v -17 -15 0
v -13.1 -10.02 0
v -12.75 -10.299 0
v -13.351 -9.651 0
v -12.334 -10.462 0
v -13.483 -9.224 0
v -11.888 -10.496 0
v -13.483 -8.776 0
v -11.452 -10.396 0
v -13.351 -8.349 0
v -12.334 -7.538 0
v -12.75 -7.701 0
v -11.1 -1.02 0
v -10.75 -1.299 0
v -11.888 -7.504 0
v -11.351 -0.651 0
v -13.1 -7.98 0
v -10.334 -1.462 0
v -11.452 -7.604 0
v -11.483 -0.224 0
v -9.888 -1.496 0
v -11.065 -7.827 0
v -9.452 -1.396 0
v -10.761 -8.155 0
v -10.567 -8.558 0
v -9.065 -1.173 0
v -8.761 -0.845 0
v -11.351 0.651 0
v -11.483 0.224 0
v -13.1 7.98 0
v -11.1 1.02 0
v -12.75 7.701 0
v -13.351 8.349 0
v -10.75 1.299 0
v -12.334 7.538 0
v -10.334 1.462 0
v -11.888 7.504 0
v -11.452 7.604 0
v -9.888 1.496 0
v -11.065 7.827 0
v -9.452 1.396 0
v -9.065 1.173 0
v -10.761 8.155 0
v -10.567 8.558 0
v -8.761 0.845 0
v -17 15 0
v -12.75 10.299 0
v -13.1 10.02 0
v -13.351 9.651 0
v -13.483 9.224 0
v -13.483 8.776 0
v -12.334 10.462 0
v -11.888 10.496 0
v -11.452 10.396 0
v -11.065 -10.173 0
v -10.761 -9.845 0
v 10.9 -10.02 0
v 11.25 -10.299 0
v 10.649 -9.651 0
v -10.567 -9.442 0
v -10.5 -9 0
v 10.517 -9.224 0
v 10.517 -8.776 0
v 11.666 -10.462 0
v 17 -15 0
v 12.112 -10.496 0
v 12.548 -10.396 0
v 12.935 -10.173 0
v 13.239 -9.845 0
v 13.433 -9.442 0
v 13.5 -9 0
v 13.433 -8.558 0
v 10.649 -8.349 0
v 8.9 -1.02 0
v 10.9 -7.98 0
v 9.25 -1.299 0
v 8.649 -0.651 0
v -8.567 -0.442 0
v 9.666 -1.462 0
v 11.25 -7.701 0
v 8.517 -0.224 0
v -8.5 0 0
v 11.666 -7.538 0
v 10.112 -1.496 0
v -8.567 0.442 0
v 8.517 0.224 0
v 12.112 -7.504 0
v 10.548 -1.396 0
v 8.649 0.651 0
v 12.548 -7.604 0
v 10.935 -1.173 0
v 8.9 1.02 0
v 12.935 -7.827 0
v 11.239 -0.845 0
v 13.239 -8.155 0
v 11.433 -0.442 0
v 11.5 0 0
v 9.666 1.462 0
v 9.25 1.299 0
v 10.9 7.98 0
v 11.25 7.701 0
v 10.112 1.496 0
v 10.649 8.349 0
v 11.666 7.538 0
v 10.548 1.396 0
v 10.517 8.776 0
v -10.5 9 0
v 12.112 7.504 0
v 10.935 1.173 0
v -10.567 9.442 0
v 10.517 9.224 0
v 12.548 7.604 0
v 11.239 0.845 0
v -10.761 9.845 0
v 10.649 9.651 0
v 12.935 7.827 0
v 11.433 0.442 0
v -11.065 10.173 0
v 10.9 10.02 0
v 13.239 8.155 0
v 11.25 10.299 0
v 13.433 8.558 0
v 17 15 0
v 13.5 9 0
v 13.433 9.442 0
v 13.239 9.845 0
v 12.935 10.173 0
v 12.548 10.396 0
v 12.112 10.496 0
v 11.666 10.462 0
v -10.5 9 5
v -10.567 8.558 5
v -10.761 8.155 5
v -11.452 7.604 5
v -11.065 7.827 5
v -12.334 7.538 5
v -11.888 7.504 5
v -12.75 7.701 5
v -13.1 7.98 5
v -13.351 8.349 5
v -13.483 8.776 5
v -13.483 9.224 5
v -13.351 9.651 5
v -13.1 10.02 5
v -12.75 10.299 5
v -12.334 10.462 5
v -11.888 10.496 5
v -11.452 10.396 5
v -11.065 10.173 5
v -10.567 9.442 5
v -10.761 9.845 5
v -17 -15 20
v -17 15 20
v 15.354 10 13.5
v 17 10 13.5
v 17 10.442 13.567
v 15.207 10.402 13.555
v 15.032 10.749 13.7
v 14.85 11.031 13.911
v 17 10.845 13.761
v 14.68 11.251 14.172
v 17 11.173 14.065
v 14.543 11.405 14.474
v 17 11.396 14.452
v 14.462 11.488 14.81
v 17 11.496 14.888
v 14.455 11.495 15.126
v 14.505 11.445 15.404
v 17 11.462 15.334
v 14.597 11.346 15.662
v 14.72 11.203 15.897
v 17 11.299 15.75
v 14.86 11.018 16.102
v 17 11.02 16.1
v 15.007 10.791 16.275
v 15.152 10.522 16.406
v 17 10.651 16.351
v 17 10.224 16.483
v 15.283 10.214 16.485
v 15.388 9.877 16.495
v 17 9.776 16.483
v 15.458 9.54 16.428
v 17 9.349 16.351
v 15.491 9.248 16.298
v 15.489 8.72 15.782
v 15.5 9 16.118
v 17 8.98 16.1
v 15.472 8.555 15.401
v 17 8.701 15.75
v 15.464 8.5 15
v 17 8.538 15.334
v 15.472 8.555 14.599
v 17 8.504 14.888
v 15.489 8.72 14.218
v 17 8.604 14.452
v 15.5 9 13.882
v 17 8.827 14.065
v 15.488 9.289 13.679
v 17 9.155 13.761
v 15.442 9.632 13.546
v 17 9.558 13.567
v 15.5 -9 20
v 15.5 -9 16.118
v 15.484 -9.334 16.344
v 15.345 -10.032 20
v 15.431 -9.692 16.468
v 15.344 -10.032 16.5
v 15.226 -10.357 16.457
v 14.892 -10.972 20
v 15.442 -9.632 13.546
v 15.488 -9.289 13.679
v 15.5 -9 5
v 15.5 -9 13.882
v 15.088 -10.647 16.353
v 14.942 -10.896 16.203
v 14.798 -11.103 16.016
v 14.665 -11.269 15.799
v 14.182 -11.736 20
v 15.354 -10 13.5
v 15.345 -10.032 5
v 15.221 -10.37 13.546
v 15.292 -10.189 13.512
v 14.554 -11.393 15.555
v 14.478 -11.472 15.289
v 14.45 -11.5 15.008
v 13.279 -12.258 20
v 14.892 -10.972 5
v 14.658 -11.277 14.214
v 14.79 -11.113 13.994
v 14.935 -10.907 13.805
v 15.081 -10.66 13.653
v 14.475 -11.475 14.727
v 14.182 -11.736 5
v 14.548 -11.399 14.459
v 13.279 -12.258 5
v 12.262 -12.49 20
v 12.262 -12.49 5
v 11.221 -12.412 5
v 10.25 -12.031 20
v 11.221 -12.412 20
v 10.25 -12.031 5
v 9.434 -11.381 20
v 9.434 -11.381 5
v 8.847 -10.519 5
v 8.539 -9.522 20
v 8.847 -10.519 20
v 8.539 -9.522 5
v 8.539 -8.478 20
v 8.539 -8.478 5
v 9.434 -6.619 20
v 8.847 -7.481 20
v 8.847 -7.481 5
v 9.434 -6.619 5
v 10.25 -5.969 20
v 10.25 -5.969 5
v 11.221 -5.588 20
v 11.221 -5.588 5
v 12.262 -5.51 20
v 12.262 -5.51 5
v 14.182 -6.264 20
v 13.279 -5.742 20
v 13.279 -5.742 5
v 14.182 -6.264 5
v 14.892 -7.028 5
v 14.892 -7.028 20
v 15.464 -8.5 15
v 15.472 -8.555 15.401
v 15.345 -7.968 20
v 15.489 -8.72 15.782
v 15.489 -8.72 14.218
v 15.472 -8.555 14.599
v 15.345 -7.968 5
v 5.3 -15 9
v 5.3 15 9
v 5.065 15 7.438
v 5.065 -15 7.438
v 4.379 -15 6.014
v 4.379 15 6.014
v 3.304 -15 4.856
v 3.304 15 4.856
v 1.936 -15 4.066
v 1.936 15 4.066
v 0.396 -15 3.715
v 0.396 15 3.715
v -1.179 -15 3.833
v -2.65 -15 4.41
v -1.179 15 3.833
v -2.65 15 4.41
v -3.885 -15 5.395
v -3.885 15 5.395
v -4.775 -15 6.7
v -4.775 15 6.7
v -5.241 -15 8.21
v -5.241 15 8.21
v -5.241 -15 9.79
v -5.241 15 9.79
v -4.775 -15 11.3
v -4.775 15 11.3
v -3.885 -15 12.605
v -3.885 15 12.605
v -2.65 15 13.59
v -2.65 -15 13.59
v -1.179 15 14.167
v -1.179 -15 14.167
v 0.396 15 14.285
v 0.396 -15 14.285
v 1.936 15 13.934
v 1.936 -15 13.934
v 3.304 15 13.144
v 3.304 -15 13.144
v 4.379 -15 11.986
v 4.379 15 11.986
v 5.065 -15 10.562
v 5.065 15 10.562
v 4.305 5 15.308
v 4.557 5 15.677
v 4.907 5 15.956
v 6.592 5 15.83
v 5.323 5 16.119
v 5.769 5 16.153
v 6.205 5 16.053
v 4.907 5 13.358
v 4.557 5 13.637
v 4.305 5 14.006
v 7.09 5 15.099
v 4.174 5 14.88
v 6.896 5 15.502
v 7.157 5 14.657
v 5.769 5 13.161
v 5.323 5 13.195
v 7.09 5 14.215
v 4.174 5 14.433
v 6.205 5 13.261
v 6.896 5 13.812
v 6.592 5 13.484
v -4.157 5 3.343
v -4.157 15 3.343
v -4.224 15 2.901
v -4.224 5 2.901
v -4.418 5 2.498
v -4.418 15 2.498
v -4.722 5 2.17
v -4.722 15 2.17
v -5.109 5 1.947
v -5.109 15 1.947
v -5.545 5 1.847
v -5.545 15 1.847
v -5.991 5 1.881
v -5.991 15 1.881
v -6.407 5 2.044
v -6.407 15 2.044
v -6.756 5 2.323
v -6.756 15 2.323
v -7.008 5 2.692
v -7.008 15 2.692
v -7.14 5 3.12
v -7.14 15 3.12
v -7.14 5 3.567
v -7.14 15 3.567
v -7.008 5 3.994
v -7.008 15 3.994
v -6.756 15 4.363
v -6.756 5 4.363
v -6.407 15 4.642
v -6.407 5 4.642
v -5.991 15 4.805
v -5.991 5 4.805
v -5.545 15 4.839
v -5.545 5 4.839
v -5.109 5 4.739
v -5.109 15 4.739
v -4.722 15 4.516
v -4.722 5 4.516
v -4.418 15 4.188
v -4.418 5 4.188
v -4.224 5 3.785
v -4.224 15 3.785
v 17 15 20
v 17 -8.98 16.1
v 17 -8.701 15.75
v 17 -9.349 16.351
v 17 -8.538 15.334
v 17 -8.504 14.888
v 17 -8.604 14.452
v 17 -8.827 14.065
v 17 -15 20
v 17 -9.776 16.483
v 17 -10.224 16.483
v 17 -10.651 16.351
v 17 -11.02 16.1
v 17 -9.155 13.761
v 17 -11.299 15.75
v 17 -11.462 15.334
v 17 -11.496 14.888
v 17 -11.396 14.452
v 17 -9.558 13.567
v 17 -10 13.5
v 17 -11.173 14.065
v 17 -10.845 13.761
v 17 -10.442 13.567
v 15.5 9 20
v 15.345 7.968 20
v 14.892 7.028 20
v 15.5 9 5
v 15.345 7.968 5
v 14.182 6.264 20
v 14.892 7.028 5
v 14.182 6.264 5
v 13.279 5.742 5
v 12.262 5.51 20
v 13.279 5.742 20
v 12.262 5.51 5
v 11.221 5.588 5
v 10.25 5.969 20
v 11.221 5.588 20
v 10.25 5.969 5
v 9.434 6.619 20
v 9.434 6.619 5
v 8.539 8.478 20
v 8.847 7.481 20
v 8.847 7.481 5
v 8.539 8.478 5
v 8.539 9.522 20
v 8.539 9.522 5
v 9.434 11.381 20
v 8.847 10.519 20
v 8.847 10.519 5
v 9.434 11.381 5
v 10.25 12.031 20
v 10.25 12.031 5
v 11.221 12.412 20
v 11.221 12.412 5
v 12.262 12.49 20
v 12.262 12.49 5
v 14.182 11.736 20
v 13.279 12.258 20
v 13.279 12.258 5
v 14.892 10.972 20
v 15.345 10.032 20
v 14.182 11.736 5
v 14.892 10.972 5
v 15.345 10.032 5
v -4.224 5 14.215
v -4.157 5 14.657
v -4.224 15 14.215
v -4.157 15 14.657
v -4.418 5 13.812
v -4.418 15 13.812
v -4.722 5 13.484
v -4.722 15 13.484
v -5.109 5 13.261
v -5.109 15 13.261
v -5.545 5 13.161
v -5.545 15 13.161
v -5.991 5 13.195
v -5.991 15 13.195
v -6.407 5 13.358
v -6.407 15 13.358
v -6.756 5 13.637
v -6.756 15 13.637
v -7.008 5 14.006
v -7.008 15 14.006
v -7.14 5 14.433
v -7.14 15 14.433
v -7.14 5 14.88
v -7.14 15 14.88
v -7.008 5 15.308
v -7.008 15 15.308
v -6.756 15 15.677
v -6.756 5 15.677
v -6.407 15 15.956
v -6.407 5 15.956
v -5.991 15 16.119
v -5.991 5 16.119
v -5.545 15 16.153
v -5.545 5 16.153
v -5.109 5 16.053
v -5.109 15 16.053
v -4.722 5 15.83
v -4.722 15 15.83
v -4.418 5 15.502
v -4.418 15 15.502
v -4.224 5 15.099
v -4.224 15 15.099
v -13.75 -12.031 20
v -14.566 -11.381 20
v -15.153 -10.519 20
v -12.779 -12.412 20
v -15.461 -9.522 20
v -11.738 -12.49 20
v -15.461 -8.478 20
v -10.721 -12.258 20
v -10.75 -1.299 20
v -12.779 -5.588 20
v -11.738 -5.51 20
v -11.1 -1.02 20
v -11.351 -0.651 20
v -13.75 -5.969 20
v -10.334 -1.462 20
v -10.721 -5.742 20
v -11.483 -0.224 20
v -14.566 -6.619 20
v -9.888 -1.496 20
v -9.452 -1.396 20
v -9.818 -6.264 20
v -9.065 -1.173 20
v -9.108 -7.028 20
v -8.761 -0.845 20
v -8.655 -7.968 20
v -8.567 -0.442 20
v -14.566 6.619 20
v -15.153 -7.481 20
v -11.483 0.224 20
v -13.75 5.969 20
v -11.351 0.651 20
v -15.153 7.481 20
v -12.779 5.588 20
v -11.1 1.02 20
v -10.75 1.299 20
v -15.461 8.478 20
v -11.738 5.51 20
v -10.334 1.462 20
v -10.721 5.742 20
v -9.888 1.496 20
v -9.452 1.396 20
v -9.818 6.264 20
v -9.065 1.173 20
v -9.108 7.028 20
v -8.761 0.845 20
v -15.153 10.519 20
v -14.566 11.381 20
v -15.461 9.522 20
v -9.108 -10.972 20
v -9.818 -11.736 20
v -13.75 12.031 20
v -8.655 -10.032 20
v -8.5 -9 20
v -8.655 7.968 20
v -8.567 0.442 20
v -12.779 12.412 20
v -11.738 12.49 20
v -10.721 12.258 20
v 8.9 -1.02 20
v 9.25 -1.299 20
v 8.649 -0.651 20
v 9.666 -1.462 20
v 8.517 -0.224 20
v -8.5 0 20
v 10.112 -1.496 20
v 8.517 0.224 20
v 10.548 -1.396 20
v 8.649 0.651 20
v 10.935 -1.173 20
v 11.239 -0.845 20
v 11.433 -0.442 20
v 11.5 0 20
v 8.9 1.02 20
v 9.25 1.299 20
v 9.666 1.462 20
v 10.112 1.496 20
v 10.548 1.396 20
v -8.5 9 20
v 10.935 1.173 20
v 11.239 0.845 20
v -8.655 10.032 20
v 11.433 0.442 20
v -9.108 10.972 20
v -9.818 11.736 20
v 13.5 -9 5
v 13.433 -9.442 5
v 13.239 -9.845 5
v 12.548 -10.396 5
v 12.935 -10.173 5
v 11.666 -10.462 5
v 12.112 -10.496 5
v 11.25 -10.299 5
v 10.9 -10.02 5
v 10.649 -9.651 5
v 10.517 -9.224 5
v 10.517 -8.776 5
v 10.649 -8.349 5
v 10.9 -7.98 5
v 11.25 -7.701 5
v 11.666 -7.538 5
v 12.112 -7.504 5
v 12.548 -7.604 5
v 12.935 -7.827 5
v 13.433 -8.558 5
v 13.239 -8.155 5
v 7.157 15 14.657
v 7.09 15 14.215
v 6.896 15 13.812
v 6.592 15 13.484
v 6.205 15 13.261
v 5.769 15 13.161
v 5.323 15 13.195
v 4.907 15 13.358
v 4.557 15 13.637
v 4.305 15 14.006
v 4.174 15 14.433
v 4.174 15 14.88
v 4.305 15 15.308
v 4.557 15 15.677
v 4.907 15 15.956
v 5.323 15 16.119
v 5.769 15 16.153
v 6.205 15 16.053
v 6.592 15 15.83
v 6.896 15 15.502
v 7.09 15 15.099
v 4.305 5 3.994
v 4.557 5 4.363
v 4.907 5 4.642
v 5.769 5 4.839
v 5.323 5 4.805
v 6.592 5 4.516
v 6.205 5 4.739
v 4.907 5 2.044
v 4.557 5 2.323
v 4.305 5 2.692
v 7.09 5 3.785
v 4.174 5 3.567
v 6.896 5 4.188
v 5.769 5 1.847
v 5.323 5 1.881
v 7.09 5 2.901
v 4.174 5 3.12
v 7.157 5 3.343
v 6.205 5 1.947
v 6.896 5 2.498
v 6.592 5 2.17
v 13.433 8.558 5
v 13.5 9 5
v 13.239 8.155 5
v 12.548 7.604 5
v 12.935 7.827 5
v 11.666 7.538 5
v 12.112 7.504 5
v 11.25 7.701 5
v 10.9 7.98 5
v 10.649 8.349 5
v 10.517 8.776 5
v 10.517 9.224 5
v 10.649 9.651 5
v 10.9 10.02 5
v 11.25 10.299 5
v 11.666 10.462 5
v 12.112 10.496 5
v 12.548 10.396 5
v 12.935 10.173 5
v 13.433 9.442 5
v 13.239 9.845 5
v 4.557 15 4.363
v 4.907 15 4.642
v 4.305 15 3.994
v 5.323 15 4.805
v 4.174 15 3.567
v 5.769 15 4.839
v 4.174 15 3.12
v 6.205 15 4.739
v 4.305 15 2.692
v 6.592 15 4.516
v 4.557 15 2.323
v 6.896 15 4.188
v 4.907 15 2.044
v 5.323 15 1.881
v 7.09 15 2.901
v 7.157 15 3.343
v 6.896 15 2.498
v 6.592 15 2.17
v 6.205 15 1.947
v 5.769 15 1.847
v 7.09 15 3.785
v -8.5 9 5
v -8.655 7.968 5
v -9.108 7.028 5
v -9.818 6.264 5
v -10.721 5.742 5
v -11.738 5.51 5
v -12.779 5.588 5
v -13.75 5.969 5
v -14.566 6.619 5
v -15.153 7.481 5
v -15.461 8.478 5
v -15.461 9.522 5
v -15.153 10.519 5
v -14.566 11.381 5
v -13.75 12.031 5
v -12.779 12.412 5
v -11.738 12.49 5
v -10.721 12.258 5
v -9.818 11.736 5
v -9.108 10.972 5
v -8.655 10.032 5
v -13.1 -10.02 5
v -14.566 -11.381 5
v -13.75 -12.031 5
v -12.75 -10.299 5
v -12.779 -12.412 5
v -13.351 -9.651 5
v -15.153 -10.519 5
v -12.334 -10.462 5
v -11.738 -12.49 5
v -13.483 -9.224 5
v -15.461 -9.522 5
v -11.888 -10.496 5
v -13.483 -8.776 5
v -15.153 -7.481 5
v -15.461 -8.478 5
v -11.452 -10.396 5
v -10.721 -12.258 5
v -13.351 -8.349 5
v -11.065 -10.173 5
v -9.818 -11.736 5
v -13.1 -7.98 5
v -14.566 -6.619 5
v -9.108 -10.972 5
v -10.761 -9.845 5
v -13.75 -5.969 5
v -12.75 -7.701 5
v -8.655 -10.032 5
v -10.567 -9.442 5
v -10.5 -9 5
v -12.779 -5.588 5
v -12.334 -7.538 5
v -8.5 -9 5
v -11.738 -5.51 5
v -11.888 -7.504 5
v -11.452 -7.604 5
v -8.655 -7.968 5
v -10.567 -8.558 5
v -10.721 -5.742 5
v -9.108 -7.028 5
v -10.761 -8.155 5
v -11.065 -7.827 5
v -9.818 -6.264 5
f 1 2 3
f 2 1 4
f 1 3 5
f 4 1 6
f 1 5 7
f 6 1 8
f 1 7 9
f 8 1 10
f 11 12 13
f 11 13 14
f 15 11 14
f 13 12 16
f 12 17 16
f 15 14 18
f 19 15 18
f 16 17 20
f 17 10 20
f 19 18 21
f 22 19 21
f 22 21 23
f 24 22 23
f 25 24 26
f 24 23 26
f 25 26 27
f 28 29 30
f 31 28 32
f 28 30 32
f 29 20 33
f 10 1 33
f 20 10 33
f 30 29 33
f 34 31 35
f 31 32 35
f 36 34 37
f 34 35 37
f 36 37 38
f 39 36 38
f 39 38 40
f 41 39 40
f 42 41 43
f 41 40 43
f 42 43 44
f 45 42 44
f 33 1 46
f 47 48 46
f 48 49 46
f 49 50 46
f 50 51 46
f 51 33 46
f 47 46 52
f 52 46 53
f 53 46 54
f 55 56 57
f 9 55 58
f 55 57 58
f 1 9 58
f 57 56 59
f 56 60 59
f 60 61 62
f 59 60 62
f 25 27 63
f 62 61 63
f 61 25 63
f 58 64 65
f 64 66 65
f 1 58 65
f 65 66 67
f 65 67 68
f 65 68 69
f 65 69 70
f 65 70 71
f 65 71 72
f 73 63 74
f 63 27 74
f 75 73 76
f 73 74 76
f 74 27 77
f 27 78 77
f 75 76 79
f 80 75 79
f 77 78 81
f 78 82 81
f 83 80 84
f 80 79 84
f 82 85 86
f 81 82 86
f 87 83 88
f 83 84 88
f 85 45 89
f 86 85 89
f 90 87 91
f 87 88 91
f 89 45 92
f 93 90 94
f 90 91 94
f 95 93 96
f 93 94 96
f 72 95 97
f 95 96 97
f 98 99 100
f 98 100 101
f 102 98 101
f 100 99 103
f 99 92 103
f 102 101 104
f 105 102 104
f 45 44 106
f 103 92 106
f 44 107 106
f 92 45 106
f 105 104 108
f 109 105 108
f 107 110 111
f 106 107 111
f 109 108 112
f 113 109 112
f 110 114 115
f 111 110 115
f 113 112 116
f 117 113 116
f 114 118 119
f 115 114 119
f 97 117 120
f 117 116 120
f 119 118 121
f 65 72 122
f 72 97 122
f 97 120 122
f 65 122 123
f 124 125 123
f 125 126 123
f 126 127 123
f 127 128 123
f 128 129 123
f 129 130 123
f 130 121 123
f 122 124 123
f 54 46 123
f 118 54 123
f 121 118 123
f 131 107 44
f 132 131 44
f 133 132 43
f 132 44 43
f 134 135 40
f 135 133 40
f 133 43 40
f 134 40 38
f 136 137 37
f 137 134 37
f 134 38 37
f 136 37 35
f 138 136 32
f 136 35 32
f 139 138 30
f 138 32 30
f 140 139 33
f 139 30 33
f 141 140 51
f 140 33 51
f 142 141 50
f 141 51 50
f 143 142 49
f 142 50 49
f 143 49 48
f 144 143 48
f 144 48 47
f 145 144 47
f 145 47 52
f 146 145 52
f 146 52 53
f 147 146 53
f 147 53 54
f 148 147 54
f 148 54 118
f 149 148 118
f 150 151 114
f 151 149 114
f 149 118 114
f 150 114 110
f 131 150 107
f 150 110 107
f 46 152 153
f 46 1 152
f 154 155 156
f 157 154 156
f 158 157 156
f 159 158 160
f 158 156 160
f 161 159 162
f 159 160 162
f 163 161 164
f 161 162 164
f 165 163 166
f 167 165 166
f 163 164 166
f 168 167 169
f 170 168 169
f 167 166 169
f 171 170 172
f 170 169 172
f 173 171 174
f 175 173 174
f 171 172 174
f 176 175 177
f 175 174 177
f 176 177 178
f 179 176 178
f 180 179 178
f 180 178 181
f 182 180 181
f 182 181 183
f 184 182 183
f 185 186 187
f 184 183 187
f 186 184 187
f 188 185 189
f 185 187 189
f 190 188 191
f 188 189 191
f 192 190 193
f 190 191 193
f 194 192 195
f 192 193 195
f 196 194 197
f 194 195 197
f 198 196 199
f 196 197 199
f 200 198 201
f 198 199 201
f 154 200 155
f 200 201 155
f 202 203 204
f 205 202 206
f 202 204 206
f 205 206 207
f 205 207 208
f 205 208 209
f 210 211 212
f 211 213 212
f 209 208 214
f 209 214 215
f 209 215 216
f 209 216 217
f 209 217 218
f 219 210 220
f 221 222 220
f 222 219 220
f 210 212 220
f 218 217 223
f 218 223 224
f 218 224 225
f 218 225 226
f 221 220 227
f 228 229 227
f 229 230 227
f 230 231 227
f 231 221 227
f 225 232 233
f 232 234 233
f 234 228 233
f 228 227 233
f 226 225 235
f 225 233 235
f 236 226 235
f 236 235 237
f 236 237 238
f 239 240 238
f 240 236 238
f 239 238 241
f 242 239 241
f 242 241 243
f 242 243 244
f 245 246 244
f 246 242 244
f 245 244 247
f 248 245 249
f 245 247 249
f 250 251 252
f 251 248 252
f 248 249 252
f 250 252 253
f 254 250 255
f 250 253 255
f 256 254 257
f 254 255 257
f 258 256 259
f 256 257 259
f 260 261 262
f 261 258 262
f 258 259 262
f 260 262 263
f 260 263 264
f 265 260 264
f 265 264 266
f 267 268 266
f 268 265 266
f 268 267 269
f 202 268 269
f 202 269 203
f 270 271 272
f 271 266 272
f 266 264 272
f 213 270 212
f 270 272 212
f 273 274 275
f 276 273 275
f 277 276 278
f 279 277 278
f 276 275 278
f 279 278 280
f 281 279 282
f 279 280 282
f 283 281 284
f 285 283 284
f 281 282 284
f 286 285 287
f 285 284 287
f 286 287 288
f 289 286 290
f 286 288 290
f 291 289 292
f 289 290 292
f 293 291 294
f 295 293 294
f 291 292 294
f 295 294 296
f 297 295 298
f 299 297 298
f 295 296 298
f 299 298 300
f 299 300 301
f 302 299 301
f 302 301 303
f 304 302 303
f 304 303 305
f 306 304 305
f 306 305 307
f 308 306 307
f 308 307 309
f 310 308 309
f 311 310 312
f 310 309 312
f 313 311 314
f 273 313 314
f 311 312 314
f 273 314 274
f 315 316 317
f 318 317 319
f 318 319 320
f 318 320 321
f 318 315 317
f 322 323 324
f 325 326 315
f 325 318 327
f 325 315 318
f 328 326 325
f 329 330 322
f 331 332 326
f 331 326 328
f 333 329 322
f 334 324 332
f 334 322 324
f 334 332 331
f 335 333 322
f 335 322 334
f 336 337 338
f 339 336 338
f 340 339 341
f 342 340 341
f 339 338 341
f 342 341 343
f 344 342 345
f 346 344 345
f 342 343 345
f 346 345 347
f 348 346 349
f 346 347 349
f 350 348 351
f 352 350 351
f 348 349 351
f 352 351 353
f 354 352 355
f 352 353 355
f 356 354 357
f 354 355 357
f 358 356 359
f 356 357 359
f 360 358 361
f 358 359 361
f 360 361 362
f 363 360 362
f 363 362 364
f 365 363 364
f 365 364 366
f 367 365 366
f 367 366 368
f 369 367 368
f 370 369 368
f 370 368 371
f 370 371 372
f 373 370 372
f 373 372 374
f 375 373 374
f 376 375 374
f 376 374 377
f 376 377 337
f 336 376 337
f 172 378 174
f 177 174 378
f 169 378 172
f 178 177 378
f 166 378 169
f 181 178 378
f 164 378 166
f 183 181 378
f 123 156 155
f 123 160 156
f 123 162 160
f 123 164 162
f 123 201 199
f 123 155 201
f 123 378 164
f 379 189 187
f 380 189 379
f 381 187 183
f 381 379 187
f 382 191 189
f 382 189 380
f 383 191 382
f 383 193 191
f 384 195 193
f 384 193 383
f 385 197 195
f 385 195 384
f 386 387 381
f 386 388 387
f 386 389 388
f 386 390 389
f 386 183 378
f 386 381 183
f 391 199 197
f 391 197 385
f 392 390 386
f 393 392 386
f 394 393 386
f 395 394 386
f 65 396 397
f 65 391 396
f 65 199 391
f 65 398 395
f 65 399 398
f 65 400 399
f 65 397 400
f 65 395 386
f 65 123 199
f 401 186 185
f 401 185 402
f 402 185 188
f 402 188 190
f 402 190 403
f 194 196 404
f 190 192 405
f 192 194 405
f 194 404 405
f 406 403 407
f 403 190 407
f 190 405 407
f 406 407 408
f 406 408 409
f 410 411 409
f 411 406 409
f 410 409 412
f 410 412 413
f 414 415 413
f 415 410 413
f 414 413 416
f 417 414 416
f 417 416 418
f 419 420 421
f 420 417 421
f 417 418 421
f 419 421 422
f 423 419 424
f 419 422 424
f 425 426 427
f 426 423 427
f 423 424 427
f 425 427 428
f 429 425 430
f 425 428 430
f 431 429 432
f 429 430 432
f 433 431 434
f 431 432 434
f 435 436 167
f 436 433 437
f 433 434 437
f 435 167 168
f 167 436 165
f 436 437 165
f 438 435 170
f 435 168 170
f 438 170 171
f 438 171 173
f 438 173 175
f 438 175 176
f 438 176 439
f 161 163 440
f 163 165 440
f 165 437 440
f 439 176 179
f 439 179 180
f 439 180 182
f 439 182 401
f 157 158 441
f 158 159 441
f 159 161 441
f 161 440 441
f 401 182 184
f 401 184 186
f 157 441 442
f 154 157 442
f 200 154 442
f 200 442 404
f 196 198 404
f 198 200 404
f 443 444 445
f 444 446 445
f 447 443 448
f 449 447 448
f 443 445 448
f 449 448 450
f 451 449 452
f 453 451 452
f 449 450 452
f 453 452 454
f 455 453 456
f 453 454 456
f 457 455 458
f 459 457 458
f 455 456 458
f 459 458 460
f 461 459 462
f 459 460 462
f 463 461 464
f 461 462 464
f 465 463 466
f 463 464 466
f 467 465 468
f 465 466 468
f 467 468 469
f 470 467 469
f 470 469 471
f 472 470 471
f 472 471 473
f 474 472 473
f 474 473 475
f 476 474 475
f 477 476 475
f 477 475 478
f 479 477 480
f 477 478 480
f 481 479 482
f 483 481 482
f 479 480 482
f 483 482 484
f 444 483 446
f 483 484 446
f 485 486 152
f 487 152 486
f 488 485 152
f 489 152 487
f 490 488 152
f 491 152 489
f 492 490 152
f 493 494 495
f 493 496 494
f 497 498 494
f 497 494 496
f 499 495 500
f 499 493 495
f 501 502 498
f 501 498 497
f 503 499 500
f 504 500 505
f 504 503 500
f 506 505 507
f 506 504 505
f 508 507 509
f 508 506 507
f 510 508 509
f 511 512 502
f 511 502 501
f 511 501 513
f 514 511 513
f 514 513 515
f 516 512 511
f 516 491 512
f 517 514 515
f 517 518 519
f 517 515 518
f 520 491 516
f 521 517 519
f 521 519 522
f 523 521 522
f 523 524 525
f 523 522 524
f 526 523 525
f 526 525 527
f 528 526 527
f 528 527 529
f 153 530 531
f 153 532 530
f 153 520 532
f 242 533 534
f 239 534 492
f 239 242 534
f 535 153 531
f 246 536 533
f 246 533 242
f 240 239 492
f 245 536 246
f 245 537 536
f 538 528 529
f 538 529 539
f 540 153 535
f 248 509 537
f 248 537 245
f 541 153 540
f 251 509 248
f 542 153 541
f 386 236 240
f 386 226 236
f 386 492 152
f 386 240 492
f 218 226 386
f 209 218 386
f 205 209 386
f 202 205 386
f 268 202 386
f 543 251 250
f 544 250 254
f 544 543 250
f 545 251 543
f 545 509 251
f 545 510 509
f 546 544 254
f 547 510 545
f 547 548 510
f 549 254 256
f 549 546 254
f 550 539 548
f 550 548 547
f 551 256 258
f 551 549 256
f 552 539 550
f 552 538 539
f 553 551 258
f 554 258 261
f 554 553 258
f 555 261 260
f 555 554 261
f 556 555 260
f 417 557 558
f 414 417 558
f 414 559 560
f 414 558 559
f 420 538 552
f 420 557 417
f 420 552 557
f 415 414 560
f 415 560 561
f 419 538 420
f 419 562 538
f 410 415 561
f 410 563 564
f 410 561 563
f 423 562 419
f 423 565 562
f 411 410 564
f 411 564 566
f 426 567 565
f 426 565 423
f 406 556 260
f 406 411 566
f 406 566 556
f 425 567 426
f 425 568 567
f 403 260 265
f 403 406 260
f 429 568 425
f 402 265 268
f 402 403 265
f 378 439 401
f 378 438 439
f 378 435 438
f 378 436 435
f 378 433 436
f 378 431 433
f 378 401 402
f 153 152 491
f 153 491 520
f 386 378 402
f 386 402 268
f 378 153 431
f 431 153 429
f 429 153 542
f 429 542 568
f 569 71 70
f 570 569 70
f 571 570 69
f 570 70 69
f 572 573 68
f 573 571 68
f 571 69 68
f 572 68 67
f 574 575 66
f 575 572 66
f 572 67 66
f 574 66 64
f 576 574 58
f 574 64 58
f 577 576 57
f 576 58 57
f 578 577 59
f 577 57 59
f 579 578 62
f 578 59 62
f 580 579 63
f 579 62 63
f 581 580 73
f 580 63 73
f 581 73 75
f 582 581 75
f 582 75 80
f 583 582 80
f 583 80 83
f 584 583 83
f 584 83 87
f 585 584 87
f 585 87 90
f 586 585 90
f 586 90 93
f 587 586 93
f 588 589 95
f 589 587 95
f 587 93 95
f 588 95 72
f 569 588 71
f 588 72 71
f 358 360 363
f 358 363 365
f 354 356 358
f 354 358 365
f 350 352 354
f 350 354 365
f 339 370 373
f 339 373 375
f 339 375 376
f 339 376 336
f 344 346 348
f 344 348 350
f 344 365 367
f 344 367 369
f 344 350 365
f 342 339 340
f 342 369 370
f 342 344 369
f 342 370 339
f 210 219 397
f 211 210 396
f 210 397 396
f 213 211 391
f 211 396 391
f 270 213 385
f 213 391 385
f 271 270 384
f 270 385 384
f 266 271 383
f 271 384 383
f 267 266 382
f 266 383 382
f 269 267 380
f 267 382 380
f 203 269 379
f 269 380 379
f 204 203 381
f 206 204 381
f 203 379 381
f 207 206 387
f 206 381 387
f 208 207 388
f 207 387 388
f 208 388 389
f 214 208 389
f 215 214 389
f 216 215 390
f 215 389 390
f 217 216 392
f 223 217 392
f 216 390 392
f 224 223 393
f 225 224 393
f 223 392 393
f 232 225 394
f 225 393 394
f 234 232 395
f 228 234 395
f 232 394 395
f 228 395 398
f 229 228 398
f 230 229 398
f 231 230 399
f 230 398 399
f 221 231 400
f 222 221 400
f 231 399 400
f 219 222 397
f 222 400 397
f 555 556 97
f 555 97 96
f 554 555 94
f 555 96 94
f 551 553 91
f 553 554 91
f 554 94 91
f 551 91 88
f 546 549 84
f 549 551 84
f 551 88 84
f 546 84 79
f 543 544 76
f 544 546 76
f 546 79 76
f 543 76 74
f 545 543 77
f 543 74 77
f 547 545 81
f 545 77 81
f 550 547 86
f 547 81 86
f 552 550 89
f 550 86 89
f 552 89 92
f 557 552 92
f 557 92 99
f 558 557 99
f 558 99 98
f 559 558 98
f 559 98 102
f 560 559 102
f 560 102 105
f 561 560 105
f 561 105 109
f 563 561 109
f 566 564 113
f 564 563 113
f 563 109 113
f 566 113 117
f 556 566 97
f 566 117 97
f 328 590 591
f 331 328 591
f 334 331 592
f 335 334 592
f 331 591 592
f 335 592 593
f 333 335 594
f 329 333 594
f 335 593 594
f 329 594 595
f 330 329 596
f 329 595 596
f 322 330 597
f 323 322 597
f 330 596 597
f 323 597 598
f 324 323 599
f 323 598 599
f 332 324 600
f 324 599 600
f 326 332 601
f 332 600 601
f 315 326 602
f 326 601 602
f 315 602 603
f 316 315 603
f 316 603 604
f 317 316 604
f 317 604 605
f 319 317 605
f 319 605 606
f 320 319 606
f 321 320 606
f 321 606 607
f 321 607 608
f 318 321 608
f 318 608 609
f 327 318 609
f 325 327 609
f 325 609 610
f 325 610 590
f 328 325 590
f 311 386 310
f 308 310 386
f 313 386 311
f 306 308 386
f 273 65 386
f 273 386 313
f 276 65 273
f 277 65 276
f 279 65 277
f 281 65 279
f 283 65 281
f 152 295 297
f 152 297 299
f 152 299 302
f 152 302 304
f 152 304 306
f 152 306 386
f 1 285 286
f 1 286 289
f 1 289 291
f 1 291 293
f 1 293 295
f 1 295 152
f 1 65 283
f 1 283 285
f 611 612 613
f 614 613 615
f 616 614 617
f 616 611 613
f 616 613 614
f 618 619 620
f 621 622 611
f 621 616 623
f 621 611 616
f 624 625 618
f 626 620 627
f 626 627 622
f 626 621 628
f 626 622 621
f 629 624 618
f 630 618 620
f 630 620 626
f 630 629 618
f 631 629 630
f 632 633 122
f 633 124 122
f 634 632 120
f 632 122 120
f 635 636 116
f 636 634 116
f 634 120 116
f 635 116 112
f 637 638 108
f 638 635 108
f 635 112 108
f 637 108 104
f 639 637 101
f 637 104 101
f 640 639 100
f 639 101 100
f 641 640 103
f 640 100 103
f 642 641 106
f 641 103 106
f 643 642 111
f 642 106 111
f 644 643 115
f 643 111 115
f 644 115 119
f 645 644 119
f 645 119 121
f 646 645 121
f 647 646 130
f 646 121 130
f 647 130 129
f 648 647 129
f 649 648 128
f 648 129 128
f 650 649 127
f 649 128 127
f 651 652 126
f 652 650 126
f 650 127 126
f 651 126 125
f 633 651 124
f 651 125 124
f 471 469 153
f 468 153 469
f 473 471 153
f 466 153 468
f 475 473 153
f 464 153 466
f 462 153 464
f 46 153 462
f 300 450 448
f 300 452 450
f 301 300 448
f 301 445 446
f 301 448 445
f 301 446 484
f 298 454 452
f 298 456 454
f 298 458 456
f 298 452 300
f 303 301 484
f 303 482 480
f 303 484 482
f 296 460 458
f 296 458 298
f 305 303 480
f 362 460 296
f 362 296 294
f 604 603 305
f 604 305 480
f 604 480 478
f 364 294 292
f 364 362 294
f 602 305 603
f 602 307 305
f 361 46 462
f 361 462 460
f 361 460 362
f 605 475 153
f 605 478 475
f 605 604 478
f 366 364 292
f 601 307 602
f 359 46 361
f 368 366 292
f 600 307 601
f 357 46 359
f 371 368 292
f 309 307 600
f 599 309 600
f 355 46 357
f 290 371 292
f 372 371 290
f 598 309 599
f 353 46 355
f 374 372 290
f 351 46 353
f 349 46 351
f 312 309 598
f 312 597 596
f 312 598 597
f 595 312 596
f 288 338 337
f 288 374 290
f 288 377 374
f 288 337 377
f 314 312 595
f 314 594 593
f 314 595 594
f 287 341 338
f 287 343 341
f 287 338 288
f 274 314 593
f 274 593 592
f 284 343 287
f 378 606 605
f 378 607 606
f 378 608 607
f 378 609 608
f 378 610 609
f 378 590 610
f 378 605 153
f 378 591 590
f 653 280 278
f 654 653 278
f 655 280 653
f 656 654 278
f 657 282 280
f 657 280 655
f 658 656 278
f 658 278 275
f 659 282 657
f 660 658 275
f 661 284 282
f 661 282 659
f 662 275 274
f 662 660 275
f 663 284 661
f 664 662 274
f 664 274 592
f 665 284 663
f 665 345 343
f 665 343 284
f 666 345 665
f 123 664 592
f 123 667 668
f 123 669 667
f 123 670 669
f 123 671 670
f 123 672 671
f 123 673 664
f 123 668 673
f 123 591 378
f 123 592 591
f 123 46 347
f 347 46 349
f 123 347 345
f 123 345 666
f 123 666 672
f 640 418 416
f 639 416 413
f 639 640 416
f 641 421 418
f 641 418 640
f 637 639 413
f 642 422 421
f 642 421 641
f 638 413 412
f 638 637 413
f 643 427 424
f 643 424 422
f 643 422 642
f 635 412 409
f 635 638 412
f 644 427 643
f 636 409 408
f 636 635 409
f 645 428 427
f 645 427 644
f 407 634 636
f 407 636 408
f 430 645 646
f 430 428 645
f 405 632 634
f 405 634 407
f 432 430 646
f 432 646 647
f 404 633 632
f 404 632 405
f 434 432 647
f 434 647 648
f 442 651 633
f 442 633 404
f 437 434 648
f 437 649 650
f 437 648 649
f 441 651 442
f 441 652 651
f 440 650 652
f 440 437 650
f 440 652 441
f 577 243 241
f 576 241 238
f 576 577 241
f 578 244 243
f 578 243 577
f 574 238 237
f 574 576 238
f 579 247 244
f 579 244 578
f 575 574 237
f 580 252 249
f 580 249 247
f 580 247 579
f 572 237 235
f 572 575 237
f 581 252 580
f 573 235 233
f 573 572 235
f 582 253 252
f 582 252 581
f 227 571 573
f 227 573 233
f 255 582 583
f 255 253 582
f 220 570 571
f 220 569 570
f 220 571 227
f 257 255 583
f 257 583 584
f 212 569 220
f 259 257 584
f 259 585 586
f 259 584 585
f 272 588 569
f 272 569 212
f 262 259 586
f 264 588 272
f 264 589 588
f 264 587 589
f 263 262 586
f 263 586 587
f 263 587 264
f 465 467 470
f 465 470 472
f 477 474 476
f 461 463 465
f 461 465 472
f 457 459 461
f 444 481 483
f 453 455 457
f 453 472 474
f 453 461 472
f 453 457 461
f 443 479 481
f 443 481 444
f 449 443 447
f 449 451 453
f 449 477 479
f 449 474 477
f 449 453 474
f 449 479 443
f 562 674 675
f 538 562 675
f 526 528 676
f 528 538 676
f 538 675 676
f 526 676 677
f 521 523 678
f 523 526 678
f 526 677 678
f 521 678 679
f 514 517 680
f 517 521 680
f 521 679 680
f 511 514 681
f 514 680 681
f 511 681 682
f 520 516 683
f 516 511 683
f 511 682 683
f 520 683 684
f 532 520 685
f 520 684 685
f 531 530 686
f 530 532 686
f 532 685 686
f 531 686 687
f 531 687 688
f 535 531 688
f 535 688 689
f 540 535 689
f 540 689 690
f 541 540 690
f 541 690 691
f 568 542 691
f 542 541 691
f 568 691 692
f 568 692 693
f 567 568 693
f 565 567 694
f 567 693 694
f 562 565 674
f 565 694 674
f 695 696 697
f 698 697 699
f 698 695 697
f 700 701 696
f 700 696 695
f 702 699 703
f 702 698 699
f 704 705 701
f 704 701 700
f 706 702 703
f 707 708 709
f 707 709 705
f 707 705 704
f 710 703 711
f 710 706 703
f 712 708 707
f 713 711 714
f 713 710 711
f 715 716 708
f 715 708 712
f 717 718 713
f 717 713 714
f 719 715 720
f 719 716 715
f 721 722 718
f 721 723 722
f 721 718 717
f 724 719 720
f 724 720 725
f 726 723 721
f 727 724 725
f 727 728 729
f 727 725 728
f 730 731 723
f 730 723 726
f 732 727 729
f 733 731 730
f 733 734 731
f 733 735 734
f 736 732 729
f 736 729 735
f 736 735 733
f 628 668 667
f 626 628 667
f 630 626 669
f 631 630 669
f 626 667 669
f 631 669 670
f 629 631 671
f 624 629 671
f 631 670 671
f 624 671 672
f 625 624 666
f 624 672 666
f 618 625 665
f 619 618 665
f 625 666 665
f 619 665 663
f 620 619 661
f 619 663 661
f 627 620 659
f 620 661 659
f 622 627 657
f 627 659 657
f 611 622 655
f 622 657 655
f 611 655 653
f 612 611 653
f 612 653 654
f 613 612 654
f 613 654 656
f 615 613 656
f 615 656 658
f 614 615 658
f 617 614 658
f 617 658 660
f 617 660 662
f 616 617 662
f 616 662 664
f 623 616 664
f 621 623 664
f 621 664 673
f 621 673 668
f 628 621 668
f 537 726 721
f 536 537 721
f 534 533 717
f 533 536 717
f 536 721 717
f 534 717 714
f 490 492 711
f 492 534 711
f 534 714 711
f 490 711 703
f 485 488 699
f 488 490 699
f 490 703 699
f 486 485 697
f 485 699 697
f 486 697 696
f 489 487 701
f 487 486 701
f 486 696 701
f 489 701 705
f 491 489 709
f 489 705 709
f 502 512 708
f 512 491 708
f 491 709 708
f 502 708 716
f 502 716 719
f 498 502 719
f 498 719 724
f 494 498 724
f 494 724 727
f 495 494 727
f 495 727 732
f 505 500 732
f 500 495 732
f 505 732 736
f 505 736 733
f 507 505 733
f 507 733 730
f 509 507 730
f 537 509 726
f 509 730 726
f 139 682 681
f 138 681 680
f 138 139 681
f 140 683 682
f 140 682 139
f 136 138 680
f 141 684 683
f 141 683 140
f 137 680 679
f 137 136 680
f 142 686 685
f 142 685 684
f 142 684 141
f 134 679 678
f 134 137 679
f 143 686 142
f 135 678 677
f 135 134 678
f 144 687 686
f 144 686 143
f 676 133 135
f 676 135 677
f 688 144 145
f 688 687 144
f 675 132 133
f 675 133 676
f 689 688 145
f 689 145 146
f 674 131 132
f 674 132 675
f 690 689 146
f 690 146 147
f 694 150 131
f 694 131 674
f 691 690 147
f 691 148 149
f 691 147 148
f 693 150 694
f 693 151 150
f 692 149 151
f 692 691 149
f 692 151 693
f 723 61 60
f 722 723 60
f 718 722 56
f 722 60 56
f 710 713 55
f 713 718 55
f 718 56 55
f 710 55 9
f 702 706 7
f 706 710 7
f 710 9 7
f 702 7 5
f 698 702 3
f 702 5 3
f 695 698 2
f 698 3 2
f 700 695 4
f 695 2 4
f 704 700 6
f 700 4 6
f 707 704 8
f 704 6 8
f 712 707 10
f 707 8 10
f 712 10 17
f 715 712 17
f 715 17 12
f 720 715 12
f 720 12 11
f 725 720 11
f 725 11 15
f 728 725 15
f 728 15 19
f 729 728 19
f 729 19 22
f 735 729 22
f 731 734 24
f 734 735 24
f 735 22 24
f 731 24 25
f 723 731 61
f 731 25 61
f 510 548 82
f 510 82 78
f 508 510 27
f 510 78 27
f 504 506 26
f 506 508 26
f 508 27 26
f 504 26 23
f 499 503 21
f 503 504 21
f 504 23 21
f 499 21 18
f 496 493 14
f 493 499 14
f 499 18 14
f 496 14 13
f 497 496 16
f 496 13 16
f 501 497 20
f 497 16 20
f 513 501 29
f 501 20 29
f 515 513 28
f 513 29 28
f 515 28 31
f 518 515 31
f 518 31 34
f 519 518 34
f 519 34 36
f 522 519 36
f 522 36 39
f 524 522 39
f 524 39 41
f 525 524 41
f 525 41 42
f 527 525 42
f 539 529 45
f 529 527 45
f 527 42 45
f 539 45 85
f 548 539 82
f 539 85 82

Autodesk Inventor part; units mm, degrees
ref_plane "YZ Plane" through (0, 0, 0) normal (1, 0, 0) x (0, 1, 0)
ref_plane "XZ Plane" through (0, 0, 0) normal (0, 1, 0) x (-1, 0, 0)
ref_plane "XY Plane" through (0, 0, 0) normal (0, 0, 1) x (1, 0, 0)
sketch "Sketch1" plane through (0, 0, 0) normal (0, 0, 1) x (1, 0, 0)
  circle A0 centre (-12, 9) radius 1.5
  line L0 (12, -9) -> (-12, -9) construction
  line L1 (-12, -9) -> (-12, 9) construction
  line L2 (-12, 9) -> (12, 9) construction
  line L3 (12, 9) -> (12, -9) construction
  line L4 (12, -9) -> (-12, 9) construction
  line L5 (-12, -9) -> (12, 9) construction
  circle A1 centre (12, 9) radius 1.5
  circle A2 centre (12, -9) radius 1.5
  circle A3 centre (-12, -9) radius 1.5
  line L6 (17, -15) -> (-17, -15)
  line L7 (-17, -15) -> (-17, 15)
  line L8 (-17, 15) -> (17, 15)
  line L9 (17, 15) -> (17, -15)
  line L10 (17, -15) -> (-17, 15) construction
  line L11 (-17, -15) -> (17, 15) construction
  circle A4 centre (0, 0) radius 4
  circle A5 centre (12, 9) radius 3.5
  circle A6 centre (-12, 9) radius 3.5
  circle A7 centre (-12, -9) radius 3.5
  circle A8 centre (12, -9) radius 3.5
  circle A9 centre (10, 0) radius 1.5
  circle A10 centre (-10, 0) radius 1.5
  line L12 (10, 0) -> (0, 0) construction
  line L13 (0, 0) -> (-10, 0) construction
  point P0 (0, 0)
  dimension "d0" = 3
  dimension "d1" = 24
  dimension "d2" = 18
  dimension "d3" = 3
  dimension "d4" = 3
  dimension "d5" = 3
  dimension "d6" = 34
  dimension "d7" = 30
  dimension "d8" = 8
  dimension "d15" = 2
  dimension "d16" = 2
  dimension "d17" = 2
  dimension "d18" = 2
  dimension "d59" = 3
  dimension "d60" = 10
  dimension "d61" = 10
  dimension "d62" = 3
extrude "Extrusion1" add sketch "Sketch1" along normal blind 20 contours L6 L7 L8 L9 | A4
extrude "Extrusion3" add sketch "Sketch1" along normal blind 5 from surface at 0 contours A5 | A6 | A7 | A8
sketch "Sketch2" plane through (-17, 15, 0) normal (0, 1, 0) x (1, 0, 0)
  circle A0 centre (17, -9) radius 5.3
  line L0 (17, -9) -> (17, 0) construction
  line L1 (17, -9) -> (22.6569, -14.6569) construction
  line L2 (17, -9) -> (25, -9) construction
  circle A1 centre (22.6569, -14.6569) radius 1.5
  circle A2 centre (22.6569, -3.3431) radius 1.5
  circle A3 centre (11.3431, -3.3431) radius 1.5
  circle A4 centre (11.3431, -14.6569) radius 1.5
  line L3 (17, -9) -> (17, 11) construction
  line L4 (20.5261, 0) -> (13.5408, 0) construction
  dimension "d11" = 10.6
  dimension "d12" = 9
  dimension "d21" = 45
  dimension "d22" = 8
  dimension "d23" = 3
  dimension "d26" = 360
  dimension "d49" = 20
  dimension "d50" = 11
extrude "Extrusion2" cut sketch "Sketch2" against normal through all contours A0
extrude "Extrusion4" cut sketch "Sketch2" against normal blind 10 contours A1 | A2 | A3 | A4
sketch "Sketch3" plane through (0, 0, 0) normal (0, 1, 0) x (-1, 0, 0)
  line L0 (-64.168, -21.8863) -> (-22.168, -21.8863)
  line L1 (-22.168, -21.8863) -> (-22.168, 20.1137)
  line L2 (-22.168, 20.1137) -> (-64.168, 20.1137)
  line L3 (-64.168, 20.1137) -> (-64.168, -21.8863)
  line L4 (-64.168, -21.8863) -> (-22.168, 20.1137) construction
  line L5 (-22.168, -21.8863) -> (-64.168, 20.1137) construction
  circle A0 centre (-27.668, 14.6137) radius 1.5
  circle A1 centre (-27.668, -16.3863) radius 1.5
  circle A2 centre (-58.668, -16.3862) radius 1.5
  circle A3 centre (-58.668, 14.6138) radius 1.5
  circle A4 centre (-43.168, -0.8863) radius 11
  circle A5 centre (-43.168, -0.8863) radius 4
  line L6 (-22.168, -17.8863) -> (-26.168, -21.8863)
  line L7 (-22.168, 16.1137) -> (-26.168, 20.1137)
  line L8 (-60.168, -21.8863) -> (-64.168, -17.8863)
  line L9 (-64.168, 16.1137) -> (-60.168, 20.1137)
  circle A6 centre (-43.168, -0.8863) radius 2.5
  point P0 (0, 0)
  dimension "d30" = 42
  dimension "d31" = 31
  dimension "d32" = 31
  dimension "d33" = 31
  dimension "d34" = 31
  dimension "d35" = 3
  dimension "d36" = 3
  dimension "d37" = 3
  dimension "d38" = 3
  dimension "d39" = 22
  dimension "d40" = 8
  dimension "d41" = 4
  dimension "d42" = 4
  dimension "d43" = 4
  dimension "d44" = 4
  dimension "d45" = 4
  dimension "d46" = 4
  dimension "d47" = 4
  dimension "d48" = 5
sketch "Sketch4" plane through (17, -15, 0) normal (1, 0, 0) x (0, 0, -1)
  circle A0 centre (-15, 25) radius 1.5
  line L0 (-20, 0) -> (-20, 30) projected
  line L1 (0, 30) -> (-20, 30) projected
  circle A1 centre (-15, 5) radius 1.5
  line L2 (0, 0) -> (-20, 0) projected
  point P0 (0, 15)
  dimension "d51" = 3
  dimension "d52" = 5
  dimension "d53" = 5
  dimension "d54" = 3
  dimension "d55" = 5
  dimension "d56" = 5
extrude "Extrusion5" cut sketch "Sketch4" against normal blind 5
equation "\"d3\" = d0"
equation "\"d4\" = d0"
equation "\"d5\" = d0"
equation "\"d16\" = d15"
equation "\"d17\" = d15"
equation "\"d18\" = d15"
equation "\"d61\" = d60"
equation "\"d32\" = d31"
equation "\"d33\" = d31"
equation "\"d34\" = d31"
equation "\"d36\" = d35"
equation "\"d37\" = d35"
equation "\"d38\" = d35"
equation "\"d42\" = d41"
equation "\"d43\" = d41"
equation "\"d44\" = d41"
equation "\"d45\" = d41"
equation "\"d46\" = d41"
equation "\"d47\" = d41"
equation "\"d54\" = d51"
equation "\"d55\" = d52"
equation "\"d56\" = d53"
properties part number "ZX Axis Carriage"
